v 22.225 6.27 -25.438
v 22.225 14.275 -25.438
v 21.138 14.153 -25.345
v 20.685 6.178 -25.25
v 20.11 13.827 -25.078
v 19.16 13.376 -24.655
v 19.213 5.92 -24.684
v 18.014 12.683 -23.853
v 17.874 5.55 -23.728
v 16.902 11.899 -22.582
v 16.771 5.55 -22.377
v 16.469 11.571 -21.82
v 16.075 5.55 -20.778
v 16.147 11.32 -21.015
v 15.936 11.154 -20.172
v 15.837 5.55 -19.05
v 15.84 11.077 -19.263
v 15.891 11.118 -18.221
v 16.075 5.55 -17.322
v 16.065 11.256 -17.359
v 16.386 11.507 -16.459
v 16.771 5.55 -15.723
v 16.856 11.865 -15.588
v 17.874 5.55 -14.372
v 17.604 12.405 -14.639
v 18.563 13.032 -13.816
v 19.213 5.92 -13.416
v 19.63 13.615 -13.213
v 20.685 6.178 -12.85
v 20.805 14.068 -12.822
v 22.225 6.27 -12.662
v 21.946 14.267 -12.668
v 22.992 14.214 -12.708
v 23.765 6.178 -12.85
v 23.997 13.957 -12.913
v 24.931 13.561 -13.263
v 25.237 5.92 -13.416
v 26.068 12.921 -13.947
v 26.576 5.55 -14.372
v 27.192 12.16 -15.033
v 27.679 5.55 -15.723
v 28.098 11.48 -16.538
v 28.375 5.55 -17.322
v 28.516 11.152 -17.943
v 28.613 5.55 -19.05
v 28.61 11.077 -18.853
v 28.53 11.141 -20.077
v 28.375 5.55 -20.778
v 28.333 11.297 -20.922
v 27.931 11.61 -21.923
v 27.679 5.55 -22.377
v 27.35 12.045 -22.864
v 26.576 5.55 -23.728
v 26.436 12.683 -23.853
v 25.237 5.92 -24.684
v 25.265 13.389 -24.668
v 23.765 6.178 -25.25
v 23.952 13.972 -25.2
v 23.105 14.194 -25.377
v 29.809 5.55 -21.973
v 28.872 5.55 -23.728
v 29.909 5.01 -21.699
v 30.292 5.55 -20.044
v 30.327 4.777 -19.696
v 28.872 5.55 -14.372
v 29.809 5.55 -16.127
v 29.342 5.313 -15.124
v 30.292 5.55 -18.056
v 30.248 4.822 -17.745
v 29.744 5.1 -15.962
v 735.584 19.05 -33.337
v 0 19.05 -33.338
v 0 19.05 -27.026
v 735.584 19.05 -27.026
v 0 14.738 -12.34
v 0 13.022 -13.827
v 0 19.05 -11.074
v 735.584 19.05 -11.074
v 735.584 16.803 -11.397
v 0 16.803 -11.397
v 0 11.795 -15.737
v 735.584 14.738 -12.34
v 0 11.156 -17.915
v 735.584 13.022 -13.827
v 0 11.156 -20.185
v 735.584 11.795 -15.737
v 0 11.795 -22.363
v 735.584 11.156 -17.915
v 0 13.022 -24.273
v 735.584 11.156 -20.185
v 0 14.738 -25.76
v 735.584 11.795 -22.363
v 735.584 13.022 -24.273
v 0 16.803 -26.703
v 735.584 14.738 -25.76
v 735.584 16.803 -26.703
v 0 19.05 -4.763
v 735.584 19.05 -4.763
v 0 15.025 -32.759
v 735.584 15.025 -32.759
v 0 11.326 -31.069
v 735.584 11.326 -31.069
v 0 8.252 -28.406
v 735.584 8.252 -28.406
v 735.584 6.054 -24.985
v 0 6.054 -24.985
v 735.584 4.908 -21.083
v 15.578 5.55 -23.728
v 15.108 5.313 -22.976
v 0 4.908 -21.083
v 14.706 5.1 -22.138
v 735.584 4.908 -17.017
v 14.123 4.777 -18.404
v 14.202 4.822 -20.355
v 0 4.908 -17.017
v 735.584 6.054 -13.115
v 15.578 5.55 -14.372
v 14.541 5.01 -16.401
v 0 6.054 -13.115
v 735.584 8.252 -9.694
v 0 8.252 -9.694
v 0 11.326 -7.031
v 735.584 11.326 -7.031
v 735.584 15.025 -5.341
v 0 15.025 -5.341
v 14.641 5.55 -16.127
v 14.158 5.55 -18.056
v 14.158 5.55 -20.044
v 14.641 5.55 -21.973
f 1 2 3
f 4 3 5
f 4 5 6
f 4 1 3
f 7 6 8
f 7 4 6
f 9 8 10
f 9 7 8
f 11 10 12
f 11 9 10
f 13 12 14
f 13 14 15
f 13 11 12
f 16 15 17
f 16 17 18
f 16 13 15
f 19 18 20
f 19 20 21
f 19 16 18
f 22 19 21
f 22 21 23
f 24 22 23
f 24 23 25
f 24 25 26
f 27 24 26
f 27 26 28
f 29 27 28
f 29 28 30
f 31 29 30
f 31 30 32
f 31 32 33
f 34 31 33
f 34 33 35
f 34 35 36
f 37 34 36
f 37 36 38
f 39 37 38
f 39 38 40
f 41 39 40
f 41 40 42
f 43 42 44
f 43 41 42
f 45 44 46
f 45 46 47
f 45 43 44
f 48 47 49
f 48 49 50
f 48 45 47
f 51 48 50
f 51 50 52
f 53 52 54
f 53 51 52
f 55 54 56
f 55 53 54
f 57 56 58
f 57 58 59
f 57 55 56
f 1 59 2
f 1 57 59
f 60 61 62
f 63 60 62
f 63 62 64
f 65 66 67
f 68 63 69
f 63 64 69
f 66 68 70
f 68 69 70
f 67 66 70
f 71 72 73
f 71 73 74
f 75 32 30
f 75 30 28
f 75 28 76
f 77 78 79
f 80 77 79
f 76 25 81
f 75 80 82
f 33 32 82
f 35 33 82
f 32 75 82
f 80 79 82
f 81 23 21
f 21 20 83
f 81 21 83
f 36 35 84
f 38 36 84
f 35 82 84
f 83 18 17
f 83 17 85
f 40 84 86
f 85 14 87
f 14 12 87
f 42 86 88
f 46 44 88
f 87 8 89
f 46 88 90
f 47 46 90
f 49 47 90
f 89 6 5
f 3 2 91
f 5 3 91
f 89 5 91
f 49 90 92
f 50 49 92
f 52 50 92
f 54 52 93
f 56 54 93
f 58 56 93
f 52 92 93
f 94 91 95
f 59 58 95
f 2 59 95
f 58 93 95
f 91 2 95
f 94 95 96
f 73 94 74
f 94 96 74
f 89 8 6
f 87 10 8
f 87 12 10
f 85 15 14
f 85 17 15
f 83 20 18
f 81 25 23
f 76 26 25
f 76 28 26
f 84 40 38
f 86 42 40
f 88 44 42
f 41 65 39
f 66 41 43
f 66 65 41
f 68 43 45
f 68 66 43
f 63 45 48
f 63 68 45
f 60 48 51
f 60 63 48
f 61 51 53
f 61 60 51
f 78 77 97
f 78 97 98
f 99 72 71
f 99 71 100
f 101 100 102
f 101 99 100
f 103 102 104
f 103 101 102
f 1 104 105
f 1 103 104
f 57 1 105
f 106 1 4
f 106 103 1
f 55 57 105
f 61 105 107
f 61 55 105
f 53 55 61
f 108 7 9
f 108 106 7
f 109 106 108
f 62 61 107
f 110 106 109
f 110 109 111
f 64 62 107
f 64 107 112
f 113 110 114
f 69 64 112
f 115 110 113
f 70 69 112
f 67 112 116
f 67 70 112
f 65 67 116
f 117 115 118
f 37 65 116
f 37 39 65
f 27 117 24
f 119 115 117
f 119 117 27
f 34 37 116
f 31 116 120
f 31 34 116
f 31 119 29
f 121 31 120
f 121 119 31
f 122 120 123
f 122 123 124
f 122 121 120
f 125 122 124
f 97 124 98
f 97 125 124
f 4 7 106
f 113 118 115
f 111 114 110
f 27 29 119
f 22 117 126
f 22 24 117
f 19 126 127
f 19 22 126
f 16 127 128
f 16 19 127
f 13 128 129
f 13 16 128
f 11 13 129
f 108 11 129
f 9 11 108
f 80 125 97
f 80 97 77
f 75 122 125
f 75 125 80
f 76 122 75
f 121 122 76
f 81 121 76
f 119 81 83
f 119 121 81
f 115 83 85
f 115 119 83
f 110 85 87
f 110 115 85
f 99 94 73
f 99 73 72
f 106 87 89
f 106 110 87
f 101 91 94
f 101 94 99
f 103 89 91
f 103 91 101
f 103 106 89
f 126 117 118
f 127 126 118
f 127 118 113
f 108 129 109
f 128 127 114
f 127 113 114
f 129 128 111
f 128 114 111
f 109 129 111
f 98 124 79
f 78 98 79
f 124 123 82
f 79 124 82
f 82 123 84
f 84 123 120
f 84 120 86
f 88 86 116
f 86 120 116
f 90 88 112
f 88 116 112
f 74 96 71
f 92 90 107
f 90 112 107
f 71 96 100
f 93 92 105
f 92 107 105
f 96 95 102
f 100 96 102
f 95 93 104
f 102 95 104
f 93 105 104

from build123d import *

# Parameters (mm, degrees)
SKETCH1_W                     = 735.584
SKETCH1_H                     = 38.1
WOOD_BLOCK_DEPTH              = 19.05
SKETCH2_R                     = 7.9756
INNER_BORE_DEPTH              = 737.816349952
SKETCH3_R                     = 6.3881
MOUTHPIECE_THROUGH_HOLE_DEPTH = 737.816349952
SKETCH5_R                     = 8.128
COUNTERBORE_DEPTH             = 5.5499
SKETCH4_OUTSIDE_W             = 187.464
SKETCH4_OUTSIDE_H             = 168.414
SKETCH4_OUTSIDE_R             = 14.2875
OUTER_DIAMETER_DEPTH          = 737.816350054


with BuildPart() as part:
    # Sketch1 → wood block (new body)
    with BuildSketch(Plane(origin=(0, 0, 0), x_dir=(1, 0, 0), z_dir=(0, 1, 0))):
        with Locations((367.792, 19.05)):
            Rectangle(SKETCH1_W, SKETCH1_H)
    extrude(amount=WOOD_BLOCK_DEPTH)

    # Sketch2 → inner bore (cut, through all)
    with BuildSketch(Plane(origin=(735.584, 0, 0), x_dir=(0, 0, -1), z_dir=(1, 0, 0))):
        with Locations((19.05, 19.05)):
            Circle(SKETCH2_R)
    extrude(amount=-INNER_BORE_DEPTH, mode=Mode.SUBTRACT)

    # Sketch3 → mouthpiece through hole (cut, through all)
    with BuildSketch(Plane(origin=(0, 0, 0), x_dir=(1, 0, 0), z_dir=(0, 1, 0))):
        with Locations(Location((22.225, 19.05, 0), (0, 0, 90))):
            Circle(SKETCH3_R)
    extrude(amount=MOUTHPIECE_THROUGH_HOLE_DEPTH, mode=Mode.SUBTRACT)

    # Sketch5 → counterbore (cut)
    with BuildSketch(Plane.XZ):
        with Locations(Location((22.225, -19.05, 0), (0, 0, 270))):
            Circle(SKETCH5_R)
    extrude(amount=-COUNTERBORE_DEPTH, mode=Mode.SUBTRACT)

    # Sketch4 outside → outer diameter (cut, through all)
    with BuildSketch(Plane.ZY):
        with Locations((-19.05, 9.525)):
            Rectangle(SKETCH4_OUTSIDE_W, SKETCH4_OUTSIDE_H)
        with Locations((-19.05, 19.05)):
            Circle(SKETCH4_OUTSIDE_R, mode=Mode.SUBTRACT)
    extrude(amount=-OUTER_DIAMETER_DEPTH, mode=Mode.SUBTRACT)


solid = part.part
